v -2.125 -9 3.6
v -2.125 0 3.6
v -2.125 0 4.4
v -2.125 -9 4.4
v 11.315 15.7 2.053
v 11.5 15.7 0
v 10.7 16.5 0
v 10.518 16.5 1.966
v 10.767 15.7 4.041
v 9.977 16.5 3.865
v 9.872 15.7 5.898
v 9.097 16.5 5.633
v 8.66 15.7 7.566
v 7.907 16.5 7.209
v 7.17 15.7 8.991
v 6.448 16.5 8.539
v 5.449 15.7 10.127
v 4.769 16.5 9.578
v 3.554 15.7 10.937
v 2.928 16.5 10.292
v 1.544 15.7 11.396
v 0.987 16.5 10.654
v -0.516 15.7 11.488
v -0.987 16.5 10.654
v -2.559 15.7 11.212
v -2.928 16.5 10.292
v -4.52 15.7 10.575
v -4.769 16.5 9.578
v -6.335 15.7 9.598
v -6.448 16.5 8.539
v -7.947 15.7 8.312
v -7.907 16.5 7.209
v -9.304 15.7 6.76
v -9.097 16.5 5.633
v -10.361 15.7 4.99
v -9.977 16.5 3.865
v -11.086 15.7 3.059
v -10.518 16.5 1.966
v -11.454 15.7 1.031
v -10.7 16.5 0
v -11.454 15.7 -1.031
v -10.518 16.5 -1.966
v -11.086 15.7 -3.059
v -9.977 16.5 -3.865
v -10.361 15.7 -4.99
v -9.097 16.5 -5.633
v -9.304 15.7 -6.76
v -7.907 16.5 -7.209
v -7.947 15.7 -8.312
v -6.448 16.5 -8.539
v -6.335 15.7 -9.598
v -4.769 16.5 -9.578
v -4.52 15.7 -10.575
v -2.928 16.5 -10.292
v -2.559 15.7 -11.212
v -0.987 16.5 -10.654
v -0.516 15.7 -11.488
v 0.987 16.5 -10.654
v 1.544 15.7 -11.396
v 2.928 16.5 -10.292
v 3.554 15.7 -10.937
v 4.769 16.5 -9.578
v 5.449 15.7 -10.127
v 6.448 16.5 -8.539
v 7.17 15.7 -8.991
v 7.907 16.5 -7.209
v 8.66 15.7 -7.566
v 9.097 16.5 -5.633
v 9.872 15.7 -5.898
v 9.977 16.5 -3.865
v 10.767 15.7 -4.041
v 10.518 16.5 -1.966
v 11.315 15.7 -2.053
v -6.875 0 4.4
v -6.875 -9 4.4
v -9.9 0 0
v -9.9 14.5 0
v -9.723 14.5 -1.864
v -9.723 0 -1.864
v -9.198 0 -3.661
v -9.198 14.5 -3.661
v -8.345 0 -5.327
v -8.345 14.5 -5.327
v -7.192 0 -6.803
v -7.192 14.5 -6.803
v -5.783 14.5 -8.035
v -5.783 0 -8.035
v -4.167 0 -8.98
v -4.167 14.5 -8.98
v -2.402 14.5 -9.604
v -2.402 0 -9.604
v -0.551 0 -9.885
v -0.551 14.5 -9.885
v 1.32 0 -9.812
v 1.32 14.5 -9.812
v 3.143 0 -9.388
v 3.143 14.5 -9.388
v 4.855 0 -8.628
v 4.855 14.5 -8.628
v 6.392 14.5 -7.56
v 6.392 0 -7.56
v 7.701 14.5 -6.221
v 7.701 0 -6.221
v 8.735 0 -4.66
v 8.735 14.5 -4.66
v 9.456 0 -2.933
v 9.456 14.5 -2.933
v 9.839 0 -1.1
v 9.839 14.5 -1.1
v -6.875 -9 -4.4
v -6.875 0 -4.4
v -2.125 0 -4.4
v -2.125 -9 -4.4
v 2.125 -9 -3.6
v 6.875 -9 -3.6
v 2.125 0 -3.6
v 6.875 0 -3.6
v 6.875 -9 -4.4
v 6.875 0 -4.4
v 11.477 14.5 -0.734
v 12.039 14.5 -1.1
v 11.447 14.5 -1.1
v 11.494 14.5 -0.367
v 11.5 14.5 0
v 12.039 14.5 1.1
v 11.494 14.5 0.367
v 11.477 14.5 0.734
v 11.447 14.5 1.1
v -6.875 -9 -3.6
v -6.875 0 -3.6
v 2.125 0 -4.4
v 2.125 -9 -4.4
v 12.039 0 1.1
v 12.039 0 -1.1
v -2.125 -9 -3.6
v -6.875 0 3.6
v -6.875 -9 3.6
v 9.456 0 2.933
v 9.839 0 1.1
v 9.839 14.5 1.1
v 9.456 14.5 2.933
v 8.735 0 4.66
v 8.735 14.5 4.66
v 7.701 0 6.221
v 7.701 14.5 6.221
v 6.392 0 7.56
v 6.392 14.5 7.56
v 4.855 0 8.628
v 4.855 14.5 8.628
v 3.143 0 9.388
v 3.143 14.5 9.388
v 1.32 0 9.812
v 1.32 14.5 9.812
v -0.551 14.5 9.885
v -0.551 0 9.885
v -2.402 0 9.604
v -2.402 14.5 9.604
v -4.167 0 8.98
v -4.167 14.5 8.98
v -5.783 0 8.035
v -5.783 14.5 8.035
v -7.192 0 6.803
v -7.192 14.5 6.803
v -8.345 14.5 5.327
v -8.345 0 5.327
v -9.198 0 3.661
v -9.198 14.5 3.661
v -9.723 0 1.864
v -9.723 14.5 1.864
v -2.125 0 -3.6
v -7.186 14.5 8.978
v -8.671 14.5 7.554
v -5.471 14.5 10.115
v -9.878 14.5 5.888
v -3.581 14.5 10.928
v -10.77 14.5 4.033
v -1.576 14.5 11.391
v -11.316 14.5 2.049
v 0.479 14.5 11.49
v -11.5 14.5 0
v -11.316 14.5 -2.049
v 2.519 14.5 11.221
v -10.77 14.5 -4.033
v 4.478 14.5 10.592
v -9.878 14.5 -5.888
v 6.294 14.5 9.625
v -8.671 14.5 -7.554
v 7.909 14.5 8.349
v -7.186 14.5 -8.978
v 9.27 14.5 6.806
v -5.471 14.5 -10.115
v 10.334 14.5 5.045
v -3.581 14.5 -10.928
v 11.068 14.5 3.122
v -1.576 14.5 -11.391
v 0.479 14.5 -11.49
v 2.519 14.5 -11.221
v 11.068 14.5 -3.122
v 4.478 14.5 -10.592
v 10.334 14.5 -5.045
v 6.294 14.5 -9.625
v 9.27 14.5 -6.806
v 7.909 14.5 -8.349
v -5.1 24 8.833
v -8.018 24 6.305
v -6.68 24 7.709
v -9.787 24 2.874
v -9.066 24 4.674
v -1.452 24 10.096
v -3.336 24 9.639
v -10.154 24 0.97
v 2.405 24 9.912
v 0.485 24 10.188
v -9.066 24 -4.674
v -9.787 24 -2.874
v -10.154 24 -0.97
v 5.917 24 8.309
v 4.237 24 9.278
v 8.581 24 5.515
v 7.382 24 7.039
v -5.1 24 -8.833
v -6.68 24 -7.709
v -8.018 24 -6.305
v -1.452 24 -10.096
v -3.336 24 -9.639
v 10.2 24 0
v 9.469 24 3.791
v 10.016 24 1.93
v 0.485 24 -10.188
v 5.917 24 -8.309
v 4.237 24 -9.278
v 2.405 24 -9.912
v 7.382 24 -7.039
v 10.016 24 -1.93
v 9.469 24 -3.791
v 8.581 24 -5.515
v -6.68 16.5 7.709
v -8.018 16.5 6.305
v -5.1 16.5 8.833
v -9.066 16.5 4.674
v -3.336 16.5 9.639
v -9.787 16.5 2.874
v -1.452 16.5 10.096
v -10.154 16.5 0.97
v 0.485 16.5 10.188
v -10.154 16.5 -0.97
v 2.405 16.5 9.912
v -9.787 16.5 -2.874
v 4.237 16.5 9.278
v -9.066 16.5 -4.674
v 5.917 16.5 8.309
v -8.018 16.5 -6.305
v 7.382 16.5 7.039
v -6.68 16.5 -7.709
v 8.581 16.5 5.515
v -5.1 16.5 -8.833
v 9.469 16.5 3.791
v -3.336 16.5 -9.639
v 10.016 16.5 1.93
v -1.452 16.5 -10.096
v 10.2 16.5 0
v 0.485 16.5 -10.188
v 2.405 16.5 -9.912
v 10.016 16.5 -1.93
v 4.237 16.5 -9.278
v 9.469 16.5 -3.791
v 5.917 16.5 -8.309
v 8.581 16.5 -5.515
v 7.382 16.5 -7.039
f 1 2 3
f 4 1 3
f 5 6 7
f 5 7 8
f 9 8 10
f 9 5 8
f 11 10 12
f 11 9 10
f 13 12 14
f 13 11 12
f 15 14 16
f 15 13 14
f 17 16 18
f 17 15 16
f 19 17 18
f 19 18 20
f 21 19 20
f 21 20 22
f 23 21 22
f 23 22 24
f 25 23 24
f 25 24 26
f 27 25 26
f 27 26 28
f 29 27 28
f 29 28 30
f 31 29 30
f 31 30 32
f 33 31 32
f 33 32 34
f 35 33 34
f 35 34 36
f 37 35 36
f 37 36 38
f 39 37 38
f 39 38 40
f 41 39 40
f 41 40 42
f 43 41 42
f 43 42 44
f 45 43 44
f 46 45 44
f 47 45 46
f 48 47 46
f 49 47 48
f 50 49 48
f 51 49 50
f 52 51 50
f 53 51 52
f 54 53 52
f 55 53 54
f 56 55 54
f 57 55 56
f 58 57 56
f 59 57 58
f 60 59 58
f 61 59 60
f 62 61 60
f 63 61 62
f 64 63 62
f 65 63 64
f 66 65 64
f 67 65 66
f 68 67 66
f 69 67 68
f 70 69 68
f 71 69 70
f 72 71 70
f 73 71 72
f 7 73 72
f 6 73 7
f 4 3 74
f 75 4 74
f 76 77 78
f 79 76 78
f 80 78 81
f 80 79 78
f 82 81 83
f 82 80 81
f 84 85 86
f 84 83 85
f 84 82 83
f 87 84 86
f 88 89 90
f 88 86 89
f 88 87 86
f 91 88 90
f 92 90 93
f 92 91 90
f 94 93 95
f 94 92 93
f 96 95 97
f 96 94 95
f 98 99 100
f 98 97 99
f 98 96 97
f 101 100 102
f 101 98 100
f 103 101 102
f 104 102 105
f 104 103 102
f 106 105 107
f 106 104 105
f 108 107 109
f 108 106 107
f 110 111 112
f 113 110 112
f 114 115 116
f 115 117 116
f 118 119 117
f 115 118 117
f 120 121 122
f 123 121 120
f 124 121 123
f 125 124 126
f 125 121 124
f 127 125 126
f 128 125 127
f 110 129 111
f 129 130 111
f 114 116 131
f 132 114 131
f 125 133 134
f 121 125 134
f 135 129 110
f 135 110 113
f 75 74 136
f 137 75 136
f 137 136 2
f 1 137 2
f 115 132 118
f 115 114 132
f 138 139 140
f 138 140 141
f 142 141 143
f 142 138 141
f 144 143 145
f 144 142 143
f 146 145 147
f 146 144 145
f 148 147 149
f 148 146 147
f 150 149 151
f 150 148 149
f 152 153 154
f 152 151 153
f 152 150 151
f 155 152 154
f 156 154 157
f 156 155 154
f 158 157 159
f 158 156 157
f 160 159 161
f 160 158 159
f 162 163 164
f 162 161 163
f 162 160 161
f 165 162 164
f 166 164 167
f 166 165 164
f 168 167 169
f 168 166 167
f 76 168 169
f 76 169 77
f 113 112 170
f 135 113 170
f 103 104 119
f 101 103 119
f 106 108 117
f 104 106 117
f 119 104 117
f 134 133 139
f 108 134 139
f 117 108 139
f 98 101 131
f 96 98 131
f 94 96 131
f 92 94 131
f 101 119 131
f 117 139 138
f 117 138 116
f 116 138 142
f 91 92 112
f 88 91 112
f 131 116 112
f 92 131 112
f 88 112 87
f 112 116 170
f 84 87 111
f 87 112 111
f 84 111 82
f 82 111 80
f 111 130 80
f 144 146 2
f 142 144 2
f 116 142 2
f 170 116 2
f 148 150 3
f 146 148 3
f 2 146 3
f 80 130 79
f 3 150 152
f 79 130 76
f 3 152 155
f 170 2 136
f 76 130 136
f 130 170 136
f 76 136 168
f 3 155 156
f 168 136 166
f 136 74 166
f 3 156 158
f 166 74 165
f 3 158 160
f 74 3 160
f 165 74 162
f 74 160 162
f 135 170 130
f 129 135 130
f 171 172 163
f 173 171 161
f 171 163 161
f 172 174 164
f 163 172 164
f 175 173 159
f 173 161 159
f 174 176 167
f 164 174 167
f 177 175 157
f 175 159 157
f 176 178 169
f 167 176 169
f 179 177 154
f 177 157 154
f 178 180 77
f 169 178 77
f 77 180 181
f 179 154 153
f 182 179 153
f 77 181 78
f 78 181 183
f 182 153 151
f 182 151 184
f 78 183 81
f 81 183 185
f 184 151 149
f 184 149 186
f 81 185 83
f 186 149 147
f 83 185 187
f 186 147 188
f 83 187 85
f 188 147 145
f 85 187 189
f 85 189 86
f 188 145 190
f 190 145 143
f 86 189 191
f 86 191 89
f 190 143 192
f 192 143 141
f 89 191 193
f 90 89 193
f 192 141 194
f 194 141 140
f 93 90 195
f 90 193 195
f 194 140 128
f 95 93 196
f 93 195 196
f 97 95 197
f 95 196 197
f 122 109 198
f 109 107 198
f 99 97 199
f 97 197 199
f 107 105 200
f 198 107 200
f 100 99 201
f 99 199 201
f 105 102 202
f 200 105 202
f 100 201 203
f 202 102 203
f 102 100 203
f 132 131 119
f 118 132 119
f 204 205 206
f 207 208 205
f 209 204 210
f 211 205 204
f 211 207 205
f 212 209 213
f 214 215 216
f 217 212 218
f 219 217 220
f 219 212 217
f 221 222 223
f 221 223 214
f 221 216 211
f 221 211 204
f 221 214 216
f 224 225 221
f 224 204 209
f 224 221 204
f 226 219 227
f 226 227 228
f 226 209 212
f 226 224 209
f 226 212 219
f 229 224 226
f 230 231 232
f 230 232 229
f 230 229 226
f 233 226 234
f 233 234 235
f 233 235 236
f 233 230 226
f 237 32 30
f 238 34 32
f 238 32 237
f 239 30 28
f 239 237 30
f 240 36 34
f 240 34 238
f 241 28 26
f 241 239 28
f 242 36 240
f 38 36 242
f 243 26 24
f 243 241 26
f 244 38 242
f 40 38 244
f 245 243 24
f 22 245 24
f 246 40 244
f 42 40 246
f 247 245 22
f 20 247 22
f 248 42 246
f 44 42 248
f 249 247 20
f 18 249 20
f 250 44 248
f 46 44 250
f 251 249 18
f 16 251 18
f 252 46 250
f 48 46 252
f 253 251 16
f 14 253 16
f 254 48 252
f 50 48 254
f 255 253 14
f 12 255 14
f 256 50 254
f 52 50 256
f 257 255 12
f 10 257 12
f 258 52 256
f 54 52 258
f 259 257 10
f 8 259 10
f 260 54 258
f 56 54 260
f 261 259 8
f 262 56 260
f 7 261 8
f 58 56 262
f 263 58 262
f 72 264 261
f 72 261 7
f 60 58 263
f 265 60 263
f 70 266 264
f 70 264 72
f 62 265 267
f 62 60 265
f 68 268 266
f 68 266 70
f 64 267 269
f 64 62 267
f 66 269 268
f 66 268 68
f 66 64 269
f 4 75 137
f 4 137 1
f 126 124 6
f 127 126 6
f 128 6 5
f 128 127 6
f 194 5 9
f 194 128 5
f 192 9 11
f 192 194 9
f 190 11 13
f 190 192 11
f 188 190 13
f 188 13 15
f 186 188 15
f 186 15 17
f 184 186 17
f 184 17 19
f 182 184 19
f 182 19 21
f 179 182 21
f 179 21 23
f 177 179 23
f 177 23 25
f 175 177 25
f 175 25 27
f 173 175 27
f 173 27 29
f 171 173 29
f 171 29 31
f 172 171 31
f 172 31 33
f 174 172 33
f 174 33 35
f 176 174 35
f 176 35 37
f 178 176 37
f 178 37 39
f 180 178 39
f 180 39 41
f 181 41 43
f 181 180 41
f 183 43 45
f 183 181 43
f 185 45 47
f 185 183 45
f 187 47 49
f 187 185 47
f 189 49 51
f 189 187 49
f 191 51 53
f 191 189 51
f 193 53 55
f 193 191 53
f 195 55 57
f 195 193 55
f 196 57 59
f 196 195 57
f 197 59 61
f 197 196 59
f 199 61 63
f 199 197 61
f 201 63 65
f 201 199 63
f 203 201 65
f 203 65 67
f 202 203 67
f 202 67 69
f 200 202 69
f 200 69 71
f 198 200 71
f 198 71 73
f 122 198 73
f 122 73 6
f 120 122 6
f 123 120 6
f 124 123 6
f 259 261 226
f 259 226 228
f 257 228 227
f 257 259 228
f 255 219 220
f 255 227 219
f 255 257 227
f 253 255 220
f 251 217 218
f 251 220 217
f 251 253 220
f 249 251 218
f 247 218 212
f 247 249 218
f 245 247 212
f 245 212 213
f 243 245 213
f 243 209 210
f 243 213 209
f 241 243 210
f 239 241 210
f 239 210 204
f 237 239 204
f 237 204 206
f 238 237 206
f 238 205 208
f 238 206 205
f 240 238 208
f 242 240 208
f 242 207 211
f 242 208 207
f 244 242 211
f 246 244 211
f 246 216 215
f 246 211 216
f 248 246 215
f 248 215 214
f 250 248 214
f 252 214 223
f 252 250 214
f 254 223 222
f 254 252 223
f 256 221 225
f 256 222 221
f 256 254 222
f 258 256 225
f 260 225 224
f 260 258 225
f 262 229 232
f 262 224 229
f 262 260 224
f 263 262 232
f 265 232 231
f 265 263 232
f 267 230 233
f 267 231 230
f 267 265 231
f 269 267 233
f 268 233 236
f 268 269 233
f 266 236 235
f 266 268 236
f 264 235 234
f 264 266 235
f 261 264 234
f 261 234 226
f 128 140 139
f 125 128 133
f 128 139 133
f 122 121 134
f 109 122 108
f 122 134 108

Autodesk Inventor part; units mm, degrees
ref_plane "YZ Plane" through (0, 0, 0) normal (1, 0, 0) x (0, 1, 0)
ref_plane "XZ Plane" through (0, 0, 0) normal (0, 1, 0) x (-1, 0, 0)
ref_plane "XY Plane" through (0, 0, 0) normal (0, 0, 1) x (1, 0, 0)
sketch "Sketch1" plane through (0, 0, 0) normal (0, 1, 0) x (-1, 0, 0)
  circle A0 centre (0, 0) radius 9.9
  line L0 (-9.8387, 1.1) -> (-12.0387, 1.1)
  line L1 (-12.0387, 1.1) -> (-12.0387, -1.1)
  line L2 (-12.0387, -1.1) -> (-9.8387, -1.1)
  point P0 (-12.0387, 0)
  dimension "d0" = 19.8
  dimension "d1" = 2.2
  dimension "d2" = 2.2
extrude "Extrusion1" add sketch "Sketch1" along normal blind 14.5
sketch "Sketch2" plane through (0, 14.5, 0) normal (0, 1, 0) x (1, 0, 0)
  circle A0 centre (0, 0) radius 11.5
  dimension "d5" = 23
extrude "Extrusion2" add sketch "Sketch2" along normal blind 2
chamfer "Chamfer1" distance 0.8 angle 45 1 edges at (-11.5, 16.5, 0)
sketch "Sketch3" plane through (0, 16.5, 0) normal (0, 1, 0) x (1, 0, 0)
  circle A0 centre (0, 0) radius 10.2
  dimension "d11" = 20.4
extrude "Extrusion3" add sketch "Sketch3" along normal blind 7.5
sketch "Sketch4" plane through (0, 0, 0) normal (0, -1, 0) x (1, 0, 0)
  line L0 (-6.875, -4.4) -> (-2.125, -4.4)
  line L1 (-2.125, -4.4) -> (-2.125, -3.6)
  line L2 (-2.125, -3.6) -> (-6.875, -3.6)
  line L3 (-6.875, -3.6) -> (-6.875, -4.4)
  line L4 (2.125, -4.4) -> (6.875, -4.4)
  line L5 (6.875, -4.4) -> (6.875, -3.6)
  line L6 (6.875, -3.6) -> (2.125, -3.6)
  line L7 (2.125, -3.6) -> (2.125, -4.4)
  line L8 (-6.875, 3.6) -> (-2.125, 3.6)
  line L9 (-2.125, 3.6) -> (-2.125, 4.4)
  line L10 (-2.125, 4.4) -> (-6.875, 4.4)
  line L11 (-6.875, 4.4) -> (-6.875, 3.6)
  line L12 (-4.5, -3.6) -> (-4.5, 3.6)
  line L13 (2.125, -4) -> (-2.125, -4)
  point P0 (0, 0)
  point P1 (-4.5, -4.4)
  point P2 (4.5, -4.4)
  point P3 (-2.125, 4)
  point P4 (-4.5, 0)
  point P5 (0, -4)
  dimension "d14" = 0.8
  dimension "d15" = 4.75
  dimension "d16" = 9
  dimension "d17" = 8
extrude "Extrusion4" add sketch "Sketch4" along normal blind 9
equation "\"d2\" = d1"
properties part number "SwitchPushButton"
